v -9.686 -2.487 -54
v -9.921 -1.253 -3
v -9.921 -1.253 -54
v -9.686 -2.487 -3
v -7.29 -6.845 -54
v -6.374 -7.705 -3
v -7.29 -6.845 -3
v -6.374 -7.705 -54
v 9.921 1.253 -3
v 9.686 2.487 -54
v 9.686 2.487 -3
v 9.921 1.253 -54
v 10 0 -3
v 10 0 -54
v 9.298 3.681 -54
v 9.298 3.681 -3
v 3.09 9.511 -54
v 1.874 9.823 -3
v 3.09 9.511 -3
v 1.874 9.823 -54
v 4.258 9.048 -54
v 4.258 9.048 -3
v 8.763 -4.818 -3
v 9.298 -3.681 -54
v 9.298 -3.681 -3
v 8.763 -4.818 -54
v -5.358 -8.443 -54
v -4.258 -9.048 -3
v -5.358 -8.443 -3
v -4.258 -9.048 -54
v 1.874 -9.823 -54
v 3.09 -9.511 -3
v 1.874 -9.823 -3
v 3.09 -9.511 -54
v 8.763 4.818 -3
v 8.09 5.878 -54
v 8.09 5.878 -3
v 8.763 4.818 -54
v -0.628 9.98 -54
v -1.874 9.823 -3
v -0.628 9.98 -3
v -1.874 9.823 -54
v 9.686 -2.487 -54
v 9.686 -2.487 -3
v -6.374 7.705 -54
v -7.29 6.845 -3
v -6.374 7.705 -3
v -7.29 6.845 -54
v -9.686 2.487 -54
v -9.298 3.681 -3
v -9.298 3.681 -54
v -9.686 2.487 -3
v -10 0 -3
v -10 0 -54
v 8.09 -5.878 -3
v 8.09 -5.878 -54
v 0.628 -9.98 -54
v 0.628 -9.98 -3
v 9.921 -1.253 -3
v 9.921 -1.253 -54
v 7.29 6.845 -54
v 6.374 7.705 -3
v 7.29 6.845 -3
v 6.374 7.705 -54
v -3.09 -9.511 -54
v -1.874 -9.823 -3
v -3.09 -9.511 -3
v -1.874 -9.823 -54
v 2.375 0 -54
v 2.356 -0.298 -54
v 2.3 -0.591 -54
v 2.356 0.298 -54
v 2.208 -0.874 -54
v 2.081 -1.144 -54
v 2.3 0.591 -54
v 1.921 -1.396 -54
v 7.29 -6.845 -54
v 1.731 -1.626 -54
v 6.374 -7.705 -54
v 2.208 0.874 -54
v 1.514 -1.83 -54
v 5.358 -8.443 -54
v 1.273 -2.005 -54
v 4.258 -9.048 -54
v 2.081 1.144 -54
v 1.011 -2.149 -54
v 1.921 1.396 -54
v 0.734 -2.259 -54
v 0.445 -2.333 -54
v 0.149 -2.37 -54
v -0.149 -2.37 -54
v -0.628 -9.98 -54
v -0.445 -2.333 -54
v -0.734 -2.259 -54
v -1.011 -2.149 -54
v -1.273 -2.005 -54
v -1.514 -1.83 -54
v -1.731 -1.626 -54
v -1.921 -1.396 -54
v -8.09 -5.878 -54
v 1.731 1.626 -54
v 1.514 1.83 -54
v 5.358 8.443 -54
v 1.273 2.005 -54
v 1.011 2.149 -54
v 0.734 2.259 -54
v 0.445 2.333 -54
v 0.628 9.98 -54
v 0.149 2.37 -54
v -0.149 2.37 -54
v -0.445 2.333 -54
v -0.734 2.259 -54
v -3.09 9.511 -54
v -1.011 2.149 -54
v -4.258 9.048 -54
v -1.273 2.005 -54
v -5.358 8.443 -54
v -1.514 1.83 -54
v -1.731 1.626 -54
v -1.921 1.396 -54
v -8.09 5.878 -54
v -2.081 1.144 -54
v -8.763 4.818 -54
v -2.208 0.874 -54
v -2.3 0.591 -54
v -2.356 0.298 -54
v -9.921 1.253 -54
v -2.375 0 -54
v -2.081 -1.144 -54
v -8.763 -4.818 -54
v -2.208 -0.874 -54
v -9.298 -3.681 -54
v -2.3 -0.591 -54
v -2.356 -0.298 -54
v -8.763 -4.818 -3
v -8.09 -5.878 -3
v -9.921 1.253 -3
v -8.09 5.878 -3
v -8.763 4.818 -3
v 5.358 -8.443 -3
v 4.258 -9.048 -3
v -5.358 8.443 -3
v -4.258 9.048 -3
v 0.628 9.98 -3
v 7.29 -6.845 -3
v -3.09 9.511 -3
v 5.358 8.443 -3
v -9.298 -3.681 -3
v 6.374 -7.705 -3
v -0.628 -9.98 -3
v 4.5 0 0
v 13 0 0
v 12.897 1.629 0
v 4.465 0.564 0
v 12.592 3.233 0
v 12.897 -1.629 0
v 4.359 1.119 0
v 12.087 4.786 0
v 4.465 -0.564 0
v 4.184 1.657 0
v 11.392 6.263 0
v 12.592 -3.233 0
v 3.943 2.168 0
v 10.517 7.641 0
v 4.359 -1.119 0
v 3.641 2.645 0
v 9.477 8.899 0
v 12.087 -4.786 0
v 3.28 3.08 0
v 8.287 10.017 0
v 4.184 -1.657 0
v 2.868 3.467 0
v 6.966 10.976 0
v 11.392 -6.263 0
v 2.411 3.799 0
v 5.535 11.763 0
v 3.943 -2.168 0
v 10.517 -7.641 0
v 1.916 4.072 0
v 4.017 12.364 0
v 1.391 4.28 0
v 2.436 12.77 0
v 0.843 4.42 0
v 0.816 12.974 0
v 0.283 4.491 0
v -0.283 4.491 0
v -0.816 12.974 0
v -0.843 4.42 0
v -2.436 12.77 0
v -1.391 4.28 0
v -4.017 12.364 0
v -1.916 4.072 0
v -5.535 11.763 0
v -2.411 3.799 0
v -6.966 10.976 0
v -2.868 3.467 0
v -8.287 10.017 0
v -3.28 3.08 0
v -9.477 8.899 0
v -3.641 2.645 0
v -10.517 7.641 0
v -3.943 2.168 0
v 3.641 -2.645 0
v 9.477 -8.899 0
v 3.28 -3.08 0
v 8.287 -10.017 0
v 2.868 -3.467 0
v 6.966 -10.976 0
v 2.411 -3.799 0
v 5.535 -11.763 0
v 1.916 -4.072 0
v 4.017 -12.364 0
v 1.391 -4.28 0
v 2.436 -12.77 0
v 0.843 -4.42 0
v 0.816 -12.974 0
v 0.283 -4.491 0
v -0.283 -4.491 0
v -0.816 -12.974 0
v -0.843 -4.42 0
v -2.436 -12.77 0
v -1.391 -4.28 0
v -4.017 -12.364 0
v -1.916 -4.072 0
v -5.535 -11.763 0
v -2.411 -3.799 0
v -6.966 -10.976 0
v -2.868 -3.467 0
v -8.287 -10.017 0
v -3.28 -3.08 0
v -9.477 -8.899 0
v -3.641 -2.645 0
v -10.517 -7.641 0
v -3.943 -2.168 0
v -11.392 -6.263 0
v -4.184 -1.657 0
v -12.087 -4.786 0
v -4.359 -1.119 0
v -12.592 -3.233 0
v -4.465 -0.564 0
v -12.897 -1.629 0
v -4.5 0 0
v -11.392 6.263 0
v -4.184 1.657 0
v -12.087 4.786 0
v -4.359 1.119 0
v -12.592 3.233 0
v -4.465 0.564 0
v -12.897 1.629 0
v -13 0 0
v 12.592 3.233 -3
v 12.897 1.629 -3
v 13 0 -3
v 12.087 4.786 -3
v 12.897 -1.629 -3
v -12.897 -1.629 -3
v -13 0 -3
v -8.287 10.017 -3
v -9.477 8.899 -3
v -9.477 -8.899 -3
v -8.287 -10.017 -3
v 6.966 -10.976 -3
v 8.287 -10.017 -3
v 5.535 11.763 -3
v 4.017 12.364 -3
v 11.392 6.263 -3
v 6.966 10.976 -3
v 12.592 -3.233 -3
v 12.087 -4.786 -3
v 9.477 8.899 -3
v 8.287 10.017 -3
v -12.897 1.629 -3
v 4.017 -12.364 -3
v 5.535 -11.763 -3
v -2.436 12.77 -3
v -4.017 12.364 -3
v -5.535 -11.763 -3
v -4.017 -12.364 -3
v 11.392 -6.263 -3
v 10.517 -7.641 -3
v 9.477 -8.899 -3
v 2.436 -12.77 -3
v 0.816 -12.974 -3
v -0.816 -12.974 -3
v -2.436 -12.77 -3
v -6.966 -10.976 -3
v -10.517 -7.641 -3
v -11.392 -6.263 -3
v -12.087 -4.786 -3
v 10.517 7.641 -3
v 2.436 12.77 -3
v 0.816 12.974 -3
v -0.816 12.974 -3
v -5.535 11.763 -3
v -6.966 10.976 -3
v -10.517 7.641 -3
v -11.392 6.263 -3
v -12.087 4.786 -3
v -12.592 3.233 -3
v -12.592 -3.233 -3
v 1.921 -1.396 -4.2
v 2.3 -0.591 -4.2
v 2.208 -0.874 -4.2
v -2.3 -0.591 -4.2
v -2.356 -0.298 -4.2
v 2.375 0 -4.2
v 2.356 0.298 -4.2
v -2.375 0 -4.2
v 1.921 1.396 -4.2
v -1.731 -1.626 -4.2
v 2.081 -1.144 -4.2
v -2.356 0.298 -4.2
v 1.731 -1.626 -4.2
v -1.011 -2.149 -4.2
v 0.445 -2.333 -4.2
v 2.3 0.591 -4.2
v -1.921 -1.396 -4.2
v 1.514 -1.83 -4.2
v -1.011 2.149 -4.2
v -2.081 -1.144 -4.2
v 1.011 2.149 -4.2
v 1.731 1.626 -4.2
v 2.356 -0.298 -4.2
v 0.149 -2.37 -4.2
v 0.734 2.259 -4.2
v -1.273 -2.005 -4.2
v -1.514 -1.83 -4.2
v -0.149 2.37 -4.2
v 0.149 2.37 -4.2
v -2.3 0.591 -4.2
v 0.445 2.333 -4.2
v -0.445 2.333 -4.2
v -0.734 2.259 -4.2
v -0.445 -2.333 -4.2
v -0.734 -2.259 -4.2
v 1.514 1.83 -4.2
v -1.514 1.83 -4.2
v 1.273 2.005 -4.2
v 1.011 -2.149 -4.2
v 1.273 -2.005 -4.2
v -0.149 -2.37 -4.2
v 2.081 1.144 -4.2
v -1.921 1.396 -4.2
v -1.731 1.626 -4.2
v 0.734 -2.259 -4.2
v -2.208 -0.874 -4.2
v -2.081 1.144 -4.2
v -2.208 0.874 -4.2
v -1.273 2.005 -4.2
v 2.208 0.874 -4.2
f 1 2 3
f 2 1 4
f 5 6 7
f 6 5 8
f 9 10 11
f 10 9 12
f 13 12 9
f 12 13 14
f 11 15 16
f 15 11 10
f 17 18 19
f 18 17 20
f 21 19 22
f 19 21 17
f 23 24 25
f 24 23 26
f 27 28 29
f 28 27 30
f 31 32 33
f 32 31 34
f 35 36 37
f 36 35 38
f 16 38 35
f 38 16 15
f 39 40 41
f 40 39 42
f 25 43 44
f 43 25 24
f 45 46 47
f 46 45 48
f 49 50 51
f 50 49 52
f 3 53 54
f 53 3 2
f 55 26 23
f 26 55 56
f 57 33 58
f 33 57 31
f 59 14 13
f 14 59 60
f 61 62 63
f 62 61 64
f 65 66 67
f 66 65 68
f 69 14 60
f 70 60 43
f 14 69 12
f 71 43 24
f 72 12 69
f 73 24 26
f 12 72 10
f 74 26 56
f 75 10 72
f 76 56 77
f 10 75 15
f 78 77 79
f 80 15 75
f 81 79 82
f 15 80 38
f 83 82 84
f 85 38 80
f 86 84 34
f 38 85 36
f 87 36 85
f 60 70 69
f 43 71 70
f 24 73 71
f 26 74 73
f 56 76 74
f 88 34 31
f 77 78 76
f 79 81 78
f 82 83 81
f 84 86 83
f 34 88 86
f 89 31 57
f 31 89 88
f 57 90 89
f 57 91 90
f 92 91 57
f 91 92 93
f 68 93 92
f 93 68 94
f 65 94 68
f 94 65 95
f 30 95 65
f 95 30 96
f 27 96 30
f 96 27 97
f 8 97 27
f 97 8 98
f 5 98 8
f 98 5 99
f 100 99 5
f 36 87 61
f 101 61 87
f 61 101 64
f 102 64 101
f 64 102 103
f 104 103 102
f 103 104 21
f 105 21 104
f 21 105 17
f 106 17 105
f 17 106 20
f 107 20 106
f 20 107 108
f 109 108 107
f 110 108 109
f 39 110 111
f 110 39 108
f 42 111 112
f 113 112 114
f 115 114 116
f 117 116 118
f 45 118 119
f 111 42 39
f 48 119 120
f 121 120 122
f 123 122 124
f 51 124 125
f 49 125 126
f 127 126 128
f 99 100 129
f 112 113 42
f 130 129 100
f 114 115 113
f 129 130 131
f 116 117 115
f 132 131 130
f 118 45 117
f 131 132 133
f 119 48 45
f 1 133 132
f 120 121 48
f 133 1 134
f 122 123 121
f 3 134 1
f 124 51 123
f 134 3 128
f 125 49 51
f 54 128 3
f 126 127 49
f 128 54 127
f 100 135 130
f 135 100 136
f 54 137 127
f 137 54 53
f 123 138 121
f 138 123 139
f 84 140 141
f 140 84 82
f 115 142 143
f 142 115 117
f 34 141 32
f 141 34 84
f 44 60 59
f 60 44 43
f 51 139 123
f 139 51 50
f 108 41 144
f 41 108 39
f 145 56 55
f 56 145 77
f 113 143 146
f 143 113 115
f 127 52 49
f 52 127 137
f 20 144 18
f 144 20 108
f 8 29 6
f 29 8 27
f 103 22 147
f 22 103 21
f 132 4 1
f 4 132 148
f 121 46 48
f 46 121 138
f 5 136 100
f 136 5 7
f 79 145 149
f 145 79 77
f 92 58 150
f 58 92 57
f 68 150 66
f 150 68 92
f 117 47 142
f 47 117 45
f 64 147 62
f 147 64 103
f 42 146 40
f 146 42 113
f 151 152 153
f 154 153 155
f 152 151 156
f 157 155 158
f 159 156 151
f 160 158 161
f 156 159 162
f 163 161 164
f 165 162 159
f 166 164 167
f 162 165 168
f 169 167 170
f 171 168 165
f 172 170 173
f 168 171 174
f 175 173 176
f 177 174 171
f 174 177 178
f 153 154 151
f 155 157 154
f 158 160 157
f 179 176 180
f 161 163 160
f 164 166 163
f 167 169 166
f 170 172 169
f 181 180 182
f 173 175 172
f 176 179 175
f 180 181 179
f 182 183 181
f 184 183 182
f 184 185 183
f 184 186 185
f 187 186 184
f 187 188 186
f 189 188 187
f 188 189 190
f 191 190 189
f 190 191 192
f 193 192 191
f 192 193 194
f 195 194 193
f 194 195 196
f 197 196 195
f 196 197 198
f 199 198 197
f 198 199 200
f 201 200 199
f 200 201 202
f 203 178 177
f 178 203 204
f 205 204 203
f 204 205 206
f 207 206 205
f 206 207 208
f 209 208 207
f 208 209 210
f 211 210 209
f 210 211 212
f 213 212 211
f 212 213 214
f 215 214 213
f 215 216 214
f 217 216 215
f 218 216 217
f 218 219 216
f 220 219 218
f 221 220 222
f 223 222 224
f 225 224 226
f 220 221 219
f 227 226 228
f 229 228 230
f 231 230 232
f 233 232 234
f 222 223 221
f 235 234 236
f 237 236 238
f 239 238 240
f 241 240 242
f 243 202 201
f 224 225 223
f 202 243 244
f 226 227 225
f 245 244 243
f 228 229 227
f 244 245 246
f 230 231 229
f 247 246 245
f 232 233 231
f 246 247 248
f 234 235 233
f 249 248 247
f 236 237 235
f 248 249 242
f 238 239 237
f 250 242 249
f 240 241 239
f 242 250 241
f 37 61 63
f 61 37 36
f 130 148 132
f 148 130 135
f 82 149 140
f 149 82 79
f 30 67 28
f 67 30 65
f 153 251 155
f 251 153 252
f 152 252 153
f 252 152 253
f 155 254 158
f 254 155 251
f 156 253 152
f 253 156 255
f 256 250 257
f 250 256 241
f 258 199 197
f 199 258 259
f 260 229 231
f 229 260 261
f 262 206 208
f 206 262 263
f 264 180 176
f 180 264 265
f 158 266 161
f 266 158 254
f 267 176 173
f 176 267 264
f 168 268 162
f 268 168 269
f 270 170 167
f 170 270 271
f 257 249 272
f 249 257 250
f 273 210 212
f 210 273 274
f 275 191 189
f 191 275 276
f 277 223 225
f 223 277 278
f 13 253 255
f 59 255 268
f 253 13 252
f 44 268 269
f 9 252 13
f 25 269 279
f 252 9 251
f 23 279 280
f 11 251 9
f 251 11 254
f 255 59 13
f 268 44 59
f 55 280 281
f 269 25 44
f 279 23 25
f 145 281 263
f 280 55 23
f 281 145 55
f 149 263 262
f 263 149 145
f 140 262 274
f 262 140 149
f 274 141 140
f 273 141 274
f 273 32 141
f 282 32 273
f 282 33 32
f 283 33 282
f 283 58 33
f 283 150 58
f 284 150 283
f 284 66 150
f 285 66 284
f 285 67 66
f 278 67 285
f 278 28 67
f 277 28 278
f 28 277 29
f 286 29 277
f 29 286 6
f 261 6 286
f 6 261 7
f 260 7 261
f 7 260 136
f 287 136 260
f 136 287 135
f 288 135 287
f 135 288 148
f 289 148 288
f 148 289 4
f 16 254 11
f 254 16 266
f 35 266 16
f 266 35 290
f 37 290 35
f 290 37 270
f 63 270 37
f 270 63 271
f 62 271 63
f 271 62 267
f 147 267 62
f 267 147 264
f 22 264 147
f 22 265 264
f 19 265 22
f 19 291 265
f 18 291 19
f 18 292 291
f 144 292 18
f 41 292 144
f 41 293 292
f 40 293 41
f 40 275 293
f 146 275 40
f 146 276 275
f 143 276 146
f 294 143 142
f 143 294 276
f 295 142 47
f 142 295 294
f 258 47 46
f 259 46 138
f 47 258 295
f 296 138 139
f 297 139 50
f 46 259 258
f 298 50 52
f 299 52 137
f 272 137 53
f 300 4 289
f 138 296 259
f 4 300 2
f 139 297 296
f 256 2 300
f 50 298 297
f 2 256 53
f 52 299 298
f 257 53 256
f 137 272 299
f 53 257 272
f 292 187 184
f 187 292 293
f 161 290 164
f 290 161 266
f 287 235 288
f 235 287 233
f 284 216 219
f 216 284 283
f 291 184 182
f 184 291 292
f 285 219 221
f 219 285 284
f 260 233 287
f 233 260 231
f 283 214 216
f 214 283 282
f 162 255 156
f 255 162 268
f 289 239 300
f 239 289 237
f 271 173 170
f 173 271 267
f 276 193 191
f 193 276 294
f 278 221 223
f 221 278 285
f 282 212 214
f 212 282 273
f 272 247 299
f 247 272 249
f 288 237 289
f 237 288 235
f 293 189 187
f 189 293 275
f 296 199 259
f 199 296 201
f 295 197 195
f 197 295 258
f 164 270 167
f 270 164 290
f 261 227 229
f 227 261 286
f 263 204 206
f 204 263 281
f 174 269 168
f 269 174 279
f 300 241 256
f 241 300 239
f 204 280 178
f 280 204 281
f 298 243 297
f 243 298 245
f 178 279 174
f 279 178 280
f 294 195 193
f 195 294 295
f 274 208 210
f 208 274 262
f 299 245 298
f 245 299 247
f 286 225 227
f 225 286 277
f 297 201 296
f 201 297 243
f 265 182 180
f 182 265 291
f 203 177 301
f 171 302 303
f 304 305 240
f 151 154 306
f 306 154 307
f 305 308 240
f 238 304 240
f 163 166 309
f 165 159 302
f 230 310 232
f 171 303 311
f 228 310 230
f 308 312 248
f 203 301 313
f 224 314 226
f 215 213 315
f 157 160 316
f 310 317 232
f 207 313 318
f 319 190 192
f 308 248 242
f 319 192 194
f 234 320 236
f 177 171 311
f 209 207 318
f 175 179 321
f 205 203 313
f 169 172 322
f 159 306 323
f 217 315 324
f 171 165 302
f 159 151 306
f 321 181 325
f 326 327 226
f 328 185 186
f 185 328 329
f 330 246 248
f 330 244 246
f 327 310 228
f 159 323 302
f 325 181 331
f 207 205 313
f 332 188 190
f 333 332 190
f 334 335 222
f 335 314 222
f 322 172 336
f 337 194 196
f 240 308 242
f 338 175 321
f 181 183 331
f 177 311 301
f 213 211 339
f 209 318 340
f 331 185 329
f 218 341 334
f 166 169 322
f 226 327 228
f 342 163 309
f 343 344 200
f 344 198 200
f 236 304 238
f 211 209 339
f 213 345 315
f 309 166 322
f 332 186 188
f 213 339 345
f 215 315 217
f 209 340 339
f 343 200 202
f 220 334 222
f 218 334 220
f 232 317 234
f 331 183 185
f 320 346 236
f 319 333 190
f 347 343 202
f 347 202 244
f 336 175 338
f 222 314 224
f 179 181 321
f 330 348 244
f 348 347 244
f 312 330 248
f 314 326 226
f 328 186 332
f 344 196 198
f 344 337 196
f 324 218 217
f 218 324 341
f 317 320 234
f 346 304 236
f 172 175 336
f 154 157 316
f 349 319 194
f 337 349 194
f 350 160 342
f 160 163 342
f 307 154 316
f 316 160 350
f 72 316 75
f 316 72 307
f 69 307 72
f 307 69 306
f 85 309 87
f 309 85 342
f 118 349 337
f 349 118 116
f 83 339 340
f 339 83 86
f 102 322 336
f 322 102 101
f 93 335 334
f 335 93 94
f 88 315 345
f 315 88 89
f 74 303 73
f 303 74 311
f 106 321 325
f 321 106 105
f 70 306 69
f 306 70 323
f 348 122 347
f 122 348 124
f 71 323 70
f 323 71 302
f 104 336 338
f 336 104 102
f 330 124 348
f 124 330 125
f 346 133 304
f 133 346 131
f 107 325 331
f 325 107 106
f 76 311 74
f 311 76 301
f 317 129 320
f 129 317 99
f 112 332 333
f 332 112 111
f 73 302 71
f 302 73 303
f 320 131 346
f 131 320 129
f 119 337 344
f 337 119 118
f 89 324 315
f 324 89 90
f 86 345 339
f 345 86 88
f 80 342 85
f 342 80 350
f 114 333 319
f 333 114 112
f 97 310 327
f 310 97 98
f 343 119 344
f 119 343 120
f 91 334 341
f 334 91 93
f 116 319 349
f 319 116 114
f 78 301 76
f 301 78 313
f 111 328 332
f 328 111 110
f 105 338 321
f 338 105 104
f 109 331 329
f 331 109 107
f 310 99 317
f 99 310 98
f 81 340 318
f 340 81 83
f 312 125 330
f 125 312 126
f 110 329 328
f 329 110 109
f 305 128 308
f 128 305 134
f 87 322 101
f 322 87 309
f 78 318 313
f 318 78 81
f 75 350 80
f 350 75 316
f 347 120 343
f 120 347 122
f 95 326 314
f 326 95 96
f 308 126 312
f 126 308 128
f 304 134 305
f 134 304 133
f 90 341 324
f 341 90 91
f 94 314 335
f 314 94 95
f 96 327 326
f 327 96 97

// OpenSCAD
$fn = 50;


difference() {
	union() {
		translate(v = [0, 0, -54.0000000000]) {
			cylinder(h = 54, r = 10.0000000000);
		}
		translate(v = [0, 0, -3.0000000000]) {
			cylinder(h = 3, r = 13.0000000000);
		}
	}
	union() {
		translate(v = [0, 0, 0]) {
			rotate(a = [0, 0, 0]) {
				difference() {
					union() {
						#translate(v = [0, 0, -54.0000000000]) {
							cylinder(h = 54, r = 2.2500000000);
						}
						#translate(v = [0, 0, -4.2000000000]) {
							cylinder(h = 4.2000000000, r1 = 2.3750000000, r2 = 4.5000000000);
						}
						#translate(v = [0, 0, -54.0000000000]) {
							cylinder(h = 54, r = 2.3750000000);
						}
						#translate(v = [0, 0, -54.0000000000]) {
							cylinder(h = 54, r = 2.2500000000);
						}
					}
					union();
				}
			}
		}
	}
}
